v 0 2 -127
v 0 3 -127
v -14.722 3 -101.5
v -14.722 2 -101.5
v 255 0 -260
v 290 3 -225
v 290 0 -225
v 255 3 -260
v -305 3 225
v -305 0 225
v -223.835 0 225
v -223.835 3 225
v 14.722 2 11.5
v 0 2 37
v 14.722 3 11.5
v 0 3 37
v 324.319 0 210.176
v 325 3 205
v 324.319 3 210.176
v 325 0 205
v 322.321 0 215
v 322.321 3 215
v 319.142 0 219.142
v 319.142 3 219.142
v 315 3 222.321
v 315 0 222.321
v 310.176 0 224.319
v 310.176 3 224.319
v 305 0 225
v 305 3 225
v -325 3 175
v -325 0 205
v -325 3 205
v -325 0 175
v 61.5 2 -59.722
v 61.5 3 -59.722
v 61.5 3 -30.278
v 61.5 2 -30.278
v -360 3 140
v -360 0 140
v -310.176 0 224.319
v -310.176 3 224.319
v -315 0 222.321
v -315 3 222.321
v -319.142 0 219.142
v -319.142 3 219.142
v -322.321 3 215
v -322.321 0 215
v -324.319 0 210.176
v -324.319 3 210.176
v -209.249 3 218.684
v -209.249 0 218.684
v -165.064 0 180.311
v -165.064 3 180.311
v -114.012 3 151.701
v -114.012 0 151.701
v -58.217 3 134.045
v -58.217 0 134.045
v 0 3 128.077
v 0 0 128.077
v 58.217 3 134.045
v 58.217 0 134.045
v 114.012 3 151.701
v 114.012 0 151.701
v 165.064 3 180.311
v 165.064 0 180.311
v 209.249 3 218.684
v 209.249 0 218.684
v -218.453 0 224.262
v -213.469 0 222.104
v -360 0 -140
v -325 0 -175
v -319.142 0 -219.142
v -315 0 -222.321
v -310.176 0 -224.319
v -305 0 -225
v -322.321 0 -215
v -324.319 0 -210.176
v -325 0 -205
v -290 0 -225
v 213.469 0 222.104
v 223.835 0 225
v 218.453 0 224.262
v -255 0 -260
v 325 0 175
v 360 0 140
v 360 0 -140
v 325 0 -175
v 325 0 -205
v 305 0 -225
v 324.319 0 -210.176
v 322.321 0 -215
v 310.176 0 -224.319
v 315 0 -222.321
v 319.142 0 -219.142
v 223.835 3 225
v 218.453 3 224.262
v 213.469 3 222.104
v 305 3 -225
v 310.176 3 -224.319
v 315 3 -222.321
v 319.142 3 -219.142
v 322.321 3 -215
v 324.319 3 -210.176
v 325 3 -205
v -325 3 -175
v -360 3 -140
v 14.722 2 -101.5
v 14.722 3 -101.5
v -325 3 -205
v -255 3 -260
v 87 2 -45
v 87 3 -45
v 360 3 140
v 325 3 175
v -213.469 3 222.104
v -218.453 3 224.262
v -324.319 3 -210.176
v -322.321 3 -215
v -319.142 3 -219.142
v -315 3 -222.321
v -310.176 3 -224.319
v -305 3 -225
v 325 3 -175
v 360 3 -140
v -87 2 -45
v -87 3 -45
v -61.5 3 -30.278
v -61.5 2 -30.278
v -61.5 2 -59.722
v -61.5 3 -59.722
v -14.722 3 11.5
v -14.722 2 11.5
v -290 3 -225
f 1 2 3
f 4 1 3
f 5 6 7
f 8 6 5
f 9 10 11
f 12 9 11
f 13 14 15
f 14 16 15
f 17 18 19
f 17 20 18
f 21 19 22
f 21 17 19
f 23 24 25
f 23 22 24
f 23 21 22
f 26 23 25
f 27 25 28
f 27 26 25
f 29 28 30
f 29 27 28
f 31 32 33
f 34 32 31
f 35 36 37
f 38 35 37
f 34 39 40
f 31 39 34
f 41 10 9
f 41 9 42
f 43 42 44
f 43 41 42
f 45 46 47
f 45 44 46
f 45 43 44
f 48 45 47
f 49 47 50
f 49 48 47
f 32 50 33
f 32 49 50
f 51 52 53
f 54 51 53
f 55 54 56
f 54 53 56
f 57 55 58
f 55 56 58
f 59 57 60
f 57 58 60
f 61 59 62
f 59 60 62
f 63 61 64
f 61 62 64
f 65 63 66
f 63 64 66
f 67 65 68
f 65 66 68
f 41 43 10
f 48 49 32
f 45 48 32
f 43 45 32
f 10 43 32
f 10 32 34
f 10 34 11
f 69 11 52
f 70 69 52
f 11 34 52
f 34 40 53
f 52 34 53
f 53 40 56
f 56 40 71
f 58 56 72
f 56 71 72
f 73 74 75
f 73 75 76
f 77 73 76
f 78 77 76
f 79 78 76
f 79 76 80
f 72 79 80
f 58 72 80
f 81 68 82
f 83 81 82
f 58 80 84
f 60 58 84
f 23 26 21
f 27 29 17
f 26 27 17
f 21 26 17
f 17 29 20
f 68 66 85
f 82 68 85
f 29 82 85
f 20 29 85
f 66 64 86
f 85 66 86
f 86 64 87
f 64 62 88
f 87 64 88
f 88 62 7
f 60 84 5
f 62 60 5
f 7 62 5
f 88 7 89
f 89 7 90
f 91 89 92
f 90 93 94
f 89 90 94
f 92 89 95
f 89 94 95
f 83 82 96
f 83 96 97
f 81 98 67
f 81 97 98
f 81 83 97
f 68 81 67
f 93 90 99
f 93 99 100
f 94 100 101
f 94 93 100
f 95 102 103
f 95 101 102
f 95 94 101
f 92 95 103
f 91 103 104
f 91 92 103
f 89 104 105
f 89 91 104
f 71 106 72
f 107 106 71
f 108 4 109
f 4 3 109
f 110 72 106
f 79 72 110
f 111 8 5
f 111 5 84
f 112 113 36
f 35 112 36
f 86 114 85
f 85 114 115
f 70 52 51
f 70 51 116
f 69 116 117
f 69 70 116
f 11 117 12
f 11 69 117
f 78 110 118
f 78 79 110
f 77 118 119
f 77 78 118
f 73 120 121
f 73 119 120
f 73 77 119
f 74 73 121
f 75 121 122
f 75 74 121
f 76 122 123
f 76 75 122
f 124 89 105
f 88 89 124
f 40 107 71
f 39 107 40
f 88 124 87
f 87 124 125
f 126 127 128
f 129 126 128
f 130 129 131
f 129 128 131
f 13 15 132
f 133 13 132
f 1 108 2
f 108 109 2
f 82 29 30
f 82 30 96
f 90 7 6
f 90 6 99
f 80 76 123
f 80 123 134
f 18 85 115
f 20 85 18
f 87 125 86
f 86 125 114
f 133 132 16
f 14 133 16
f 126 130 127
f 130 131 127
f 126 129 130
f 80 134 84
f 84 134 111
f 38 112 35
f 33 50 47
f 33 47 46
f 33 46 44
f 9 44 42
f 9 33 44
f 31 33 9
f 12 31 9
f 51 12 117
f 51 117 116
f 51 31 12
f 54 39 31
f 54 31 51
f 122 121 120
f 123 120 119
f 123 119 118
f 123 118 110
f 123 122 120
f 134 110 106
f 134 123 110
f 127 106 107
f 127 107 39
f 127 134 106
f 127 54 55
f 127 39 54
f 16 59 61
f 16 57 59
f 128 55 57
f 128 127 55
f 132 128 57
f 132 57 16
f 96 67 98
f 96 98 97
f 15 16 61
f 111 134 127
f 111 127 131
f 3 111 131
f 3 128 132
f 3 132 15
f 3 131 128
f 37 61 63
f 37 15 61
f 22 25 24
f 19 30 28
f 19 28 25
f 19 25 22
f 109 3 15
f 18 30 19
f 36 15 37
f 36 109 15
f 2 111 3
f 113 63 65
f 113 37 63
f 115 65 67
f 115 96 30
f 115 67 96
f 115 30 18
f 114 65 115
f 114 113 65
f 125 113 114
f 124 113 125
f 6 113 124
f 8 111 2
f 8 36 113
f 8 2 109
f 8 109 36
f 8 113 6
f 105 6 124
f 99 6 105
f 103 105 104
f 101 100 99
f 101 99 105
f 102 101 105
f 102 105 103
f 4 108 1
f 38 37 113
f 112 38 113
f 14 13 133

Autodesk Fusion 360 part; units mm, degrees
sketch "Esquisse1" plane through (0, 0, 0) normal (0, 1, 0) x (1, 0, 0)
  line L0 (-367.4671, -125) -> (350, -125) construction
  arc A0 (209.2489, -218.6842) -> (223.8346, -225) centre (223.8346, -205) ccw
  arc A1 (-223.8346, -225) -> (-209.2489, -218.6842) centre (-223.8346, -205) ccw
  arc A2 (209.2489, -218.6842) -> (-209.2489, -218.6842) centre (0, -415) ccw
  line L1 (-305, 225) -> (305, 225)
  line L2 (325, 205) -> (325, -205)
  line L3 (305, -225) -> (223.8346, -225)
  line L4 (-325, -205) -> (-325, 205)
  arc A3 (325, 205) -> (305, 225) centre (305, 205) ccw
  line L5 (325, 225) -> (-325, -225) construction
  arc A4 (-305, 225) -> (-325, 205) centre (-305, 205) ccw
  arc A5 (-325, -205) -> (-305, -225) centre (-305, -205) ccw
  line L6 (-305, -225) -> (-223.8346, -225)
  line L7 (-325, 225) -> (325, -225) construction
  arc A6 (305, -225) -> (325, -205) centre (305, -205) ccw
  line L8 (215, -225) -> (325, -225)
  point P0 (-215, -225)
  dimension "d12" = 650
  dimension "d13" = 450
  dimension "d14" = 110
  dimension "d15" = 110
  dimension "d16" = 100
  dimension "d20" = 190
  dimension "d21" = 20
extrude "Extrusion1" add sketch "Esquisse1" along normal blind 3
sketch "Esquisse2" plane through (0, 3, 0) normal (0, 1, 0) x (-1, 0, 0)
  arc A0 (325, 205) -> (305, 225) centre (305, 205) ccw
  line L0 (305, 225) -> (223.8346, 225)
  arc A1 (223.8346, 225) -> (209.2489, 218.6842) centre (223.8346, 205) ccw
  arc A2 (-209.2489, 218.6842) -> (209.2489, 218.6842) centre (0, 415) ccw
  arc A3 (-209.2489, 218.6842) -> (-223.8346, 225) centre (-223.8346, 205) ccw
  line L1 (-223.8346, 225) -> (-305, 225)
  arc A4 (-305, 225) -> (-325, 205) centre (-305, 205) ccw
  line L2 (-325, 205) -> (-325, -205)
  arc A5 (-325, -205) -> (-305, -225) centre (-305, -205) ccw
  line L3 (-305, -225) -> (305, -225)
  arc A6 (305, -225) -> (325, -205) centre (305, -205) ccw
  line L4 (325, -205) -> (325, 205)
  line L5 (14.7224, 11.5) -> (0, 37)
  line L6 (-14.7224, 11.5) -> (14.7224, 11.5)
  line L7 (0, 37) -> (-14.7224, 11.5)
  line L8 (-61.5, -59.7224) -> (-61.5, -30.2776)
  line L9 (-87, -45) -> (-61.5, -59.7224)
  line L10 (-61.5, -30.2776) -> (-87, -45)
  line L11 (-14.7224, -101.5) -> (0, -127)
  line L12 (0, -127) -> (14.7224, -101.5)
  line L13 (14.7224, -101.5) -> (-14.7224, -101.5)
  line L14 (61.5, -30.2776) -> (61.5, -59.7224)
  line L15 (388.9907, -50) -> (-400, -50) construction
  line L16 (87, -45) -> (61.5, -30.2776)
  line L17 (61.5, -59.7224) -> (87, -45)
  point P0 (70, -45)
  point P1 (0, -110)
  point P2 (0, 20)
  dimension "d46" = 5
  dimension "d48" = 70
  dimension "d52" = 17
extrude "Extrusion2" cut sketch "Esquisse2" against normal blind 1 contours L5 L6 L7 | L8 L9 L10 | L11 L12 L13 | L14 L16 L17
sketch "Esquisse3" plane through (0, 3, 0) normal (0, 1, 0) x (-1, 0, 0)
  line L0 (0, -127) -> (-14.7224, -101.5)
  line L1 (-14.7224, -101.5) -> (14.7224, -101.5)
  line L2 (14.7224, -101.5) -> (0, -127)
  line L3 (-61.5, -59.7224) -> (-87, -45)
  line L4 (-87, -45) -> (-61.5, -30.2776)
  line L5 (-61.5, -30.2776) -> (-61.5, -59.7224)
  line L6 (61.5, -30.2776) -> (87, -45)
  line L7 (87, -45) -> (61.5, -59.7224)
  line L8 (61.5, -59.7224) -> (61.5, -30.2776)
  line L9 (14.7224, 11.5) -> (-14.7224, 11.5)
  line L10 (-14.7224, 11.5) -> (0, 37)
  line L11 (0, 37) -> (14.7224, 11.5)
  arc A0 (325, 205) -> (305, 225) centre (305, 205) ccw
  line L12 (305, 225) -> (223.8346, 225)
  arc A1 (223.8346, 225) -> (209.2489, 218.6842) centre (223.8346, 205) ccw
  arc A2 (-209.2489, 218.6842) -> (209.2489, 218.6842) centre (0, 415) ccw
  arc A3 (-209.2489, 218.6842) -> (-223.8346, 225) centre (-223.8346, 205) ccw
  line L13 (-223.8346, 225) -> (-305, 225)
  arc A4 (-305, 225) -> (-325, 205) centre (-305, 205) ccw
  line L14 (-325, 205) -> (-325, -205)
  arc A5 (-325, -205) -> (-305, -225) centre (-305, -205) ccw
  line L15 (-305, -225) -> (305, -225)
  arc A6 (305, -225) -> (325, -205) centre (305, -205) ccw
  line L16 (325, -205) -> (325, 205)
  line L17 (0, -325) -> (0, 225)
  line L18 (290, -225) -> (255, -260)
  line L19 (255, -260) -> (0, -260)
  line L20 (325, -175) -> (360, -140)
  line L21 (360, -140) -> (360, 140)
  line L22 (360, 140) -> (325, 175)
  line L23 (-255, -260) -> (0, -260)
  line L24 (-290, -225) -> (-255, -260)
  line L25 (-325, -175) -> (-360, -140)
  line L26 (-360, -140) -> (-360, 140)
  line L27 (-360, 140) -> (-325, 175)
  dimension "d22" = 35
  dimension "d23" = 45
  dimension "d24" = 580
  dimension "d25" = 35
  dimension "d26" = 45
  dimension "d27" = 45
  dimension "d28" = 350
  dimension "d30" = 30
extrude "Extrusion3" add sketch "Esquisse3" against normal up to surface (3 mm away) contours L15 L17 L23 L24 | L15 L17 L18 L19 | L14 L25 L26 L27 | L16 L20 L21 L22
sketch "Esquisse4" plane through (0, 3, 0) normal (0, 1, 0) x (-1, 0, 0)
  line L0 (0, -127) -> (-14.7224, -101.5)
  line L1 (-14.7224, -101.5) -> (14.7224, -101.5)
  line L2 (14.7224, -101.5) -> (0, -127)
  line L3 (-61.5, -59.7224) -> (-87, -45)
  line L4 (-87, -45) -> (-61.5, -30.2776)
  line L5 (-61.5, -30.2776) -> (-61.5, -59.7224)
  line L6 (61.5, -30.2776) -> (87, -45)
  line L7 (87, -45) -> (61.5, -59.7224)
  line L8 (61.5, -59.7224) -> (61.5, -30.2776)
  line L9 (14.7224, 11.5) -> (-14.7224, 11.5)
  line L10 (-14.7224, 11.5) -> (0, 37)
  line L11 (0, 37) -> (14.7224, 11.5)
  arc A0 (325, 205) -> (305, 225) centre (305, 205) ccw
  line L12 (305, 225) -> (223.8346, 225)
  arc A1 (223.8346, 225) -> (209.2489, 218.6842) centre (223.8346, 205) ccw
  arc A2 (-209.2489, 218.6842) -> (209.2489, 218.6842) centre (0, 415) ccw
  arc A3 (-209.2489, 218.6842) -> (-223.8346, 225) centre (-223.8346, 205) ccw
  line L13 (-223.8346, 225) -> (-305, 225)
  arc A4 (-305, 225) -> (-325, 205) centre (-305, 205) ccw
  line L14 (-325, 205) -> (-325, 175)
  line L15 (-325, 175) -> (-360, 140)
  line L16 (-360, 140) -> (-360, -140)
  line L17 (-360, -140) -> (-325, -175)
  line L18 (-325, -175) -> (-325, -205)
  arc A5 (-325, -205) -> (-305, -225) centre (-305, -205) ccw
  line L19 (-305, -225) -> (-290, -225)
  line L20 (-290, -225) -> (-255, -260)
  line L21 (-255, -260) -> (255, -260)
  line L22 (255, -260) -> (290, -225)
  line L23 (290, -225) -> (305, -225)
  arc A6 (305, -225) -> (325, -205) centre (305, -205) ccw
  line L24 (325, -205) -> (325, -175)
  line L25 (325, -175) -> (360, -140)
  line L26 (360, -140) -> (360, 140)
  line L27 (360, 140) -> (325, 175)
  line L28 (325, 175) -> (325, 205)
